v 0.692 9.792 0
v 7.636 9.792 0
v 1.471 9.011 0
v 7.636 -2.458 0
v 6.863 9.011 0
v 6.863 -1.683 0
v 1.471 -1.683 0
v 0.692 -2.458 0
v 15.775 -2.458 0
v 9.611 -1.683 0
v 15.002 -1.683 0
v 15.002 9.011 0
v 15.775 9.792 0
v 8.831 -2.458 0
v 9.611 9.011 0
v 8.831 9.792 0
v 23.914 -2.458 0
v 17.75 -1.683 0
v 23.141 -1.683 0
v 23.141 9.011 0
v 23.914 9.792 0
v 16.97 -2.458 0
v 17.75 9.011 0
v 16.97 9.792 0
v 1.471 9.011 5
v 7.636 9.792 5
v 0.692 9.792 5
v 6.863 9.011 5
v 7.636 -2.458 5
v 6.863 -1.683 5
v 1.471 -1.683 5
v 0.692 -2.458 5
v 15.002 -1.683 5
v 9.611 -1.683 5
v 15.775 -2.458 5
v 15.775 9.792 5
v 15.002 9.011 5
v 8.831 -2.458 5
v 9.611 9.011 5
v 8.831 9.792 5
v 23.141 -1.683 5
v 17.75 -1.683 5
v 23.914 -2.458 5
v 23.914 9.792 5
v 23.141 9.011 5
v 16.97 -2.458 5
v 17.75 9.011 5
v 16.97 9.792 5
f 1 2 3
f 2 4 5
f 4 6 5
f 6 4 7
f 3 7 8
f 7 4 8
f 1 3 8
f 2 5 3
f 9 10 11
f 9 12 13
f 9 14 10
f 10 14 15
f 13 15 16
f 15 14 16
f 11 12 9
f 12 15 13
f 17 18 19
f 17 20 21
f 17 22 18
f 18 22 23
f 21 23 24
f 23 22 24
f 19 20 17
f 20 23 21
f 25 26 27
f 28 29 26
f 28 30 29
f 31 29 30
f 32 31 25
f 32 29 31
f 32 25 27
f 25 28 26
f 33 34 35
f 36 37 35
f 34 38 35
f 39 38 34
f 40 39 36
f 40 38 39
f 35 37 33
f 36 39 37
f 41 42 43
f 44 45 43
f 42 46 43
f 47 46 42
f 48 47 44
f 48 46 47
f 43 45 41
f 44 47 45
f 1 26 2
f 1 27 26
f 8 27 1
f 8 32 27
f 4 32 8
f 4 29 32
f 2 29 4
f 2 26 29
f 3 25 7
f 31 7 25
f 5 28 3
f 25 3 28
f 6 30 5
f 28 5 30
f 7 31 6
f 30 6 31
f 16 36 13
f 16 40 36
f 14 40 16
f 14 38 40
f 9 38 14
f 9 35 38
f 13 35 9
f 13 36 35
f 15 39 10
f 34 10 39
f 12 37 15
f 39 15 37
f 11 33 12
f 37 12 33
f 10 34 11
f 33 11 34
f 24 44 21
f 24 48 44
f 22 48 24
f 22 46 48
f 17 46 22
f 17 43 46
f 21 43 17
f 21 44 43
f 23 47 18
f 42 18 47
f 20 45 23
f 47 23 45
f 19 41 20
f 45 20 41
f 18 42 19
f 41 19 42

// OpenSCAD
txt = "日本語";

linear_extrude(height = 5) {
  text(txt, font = "Hiragino Mincho ProN");
}
